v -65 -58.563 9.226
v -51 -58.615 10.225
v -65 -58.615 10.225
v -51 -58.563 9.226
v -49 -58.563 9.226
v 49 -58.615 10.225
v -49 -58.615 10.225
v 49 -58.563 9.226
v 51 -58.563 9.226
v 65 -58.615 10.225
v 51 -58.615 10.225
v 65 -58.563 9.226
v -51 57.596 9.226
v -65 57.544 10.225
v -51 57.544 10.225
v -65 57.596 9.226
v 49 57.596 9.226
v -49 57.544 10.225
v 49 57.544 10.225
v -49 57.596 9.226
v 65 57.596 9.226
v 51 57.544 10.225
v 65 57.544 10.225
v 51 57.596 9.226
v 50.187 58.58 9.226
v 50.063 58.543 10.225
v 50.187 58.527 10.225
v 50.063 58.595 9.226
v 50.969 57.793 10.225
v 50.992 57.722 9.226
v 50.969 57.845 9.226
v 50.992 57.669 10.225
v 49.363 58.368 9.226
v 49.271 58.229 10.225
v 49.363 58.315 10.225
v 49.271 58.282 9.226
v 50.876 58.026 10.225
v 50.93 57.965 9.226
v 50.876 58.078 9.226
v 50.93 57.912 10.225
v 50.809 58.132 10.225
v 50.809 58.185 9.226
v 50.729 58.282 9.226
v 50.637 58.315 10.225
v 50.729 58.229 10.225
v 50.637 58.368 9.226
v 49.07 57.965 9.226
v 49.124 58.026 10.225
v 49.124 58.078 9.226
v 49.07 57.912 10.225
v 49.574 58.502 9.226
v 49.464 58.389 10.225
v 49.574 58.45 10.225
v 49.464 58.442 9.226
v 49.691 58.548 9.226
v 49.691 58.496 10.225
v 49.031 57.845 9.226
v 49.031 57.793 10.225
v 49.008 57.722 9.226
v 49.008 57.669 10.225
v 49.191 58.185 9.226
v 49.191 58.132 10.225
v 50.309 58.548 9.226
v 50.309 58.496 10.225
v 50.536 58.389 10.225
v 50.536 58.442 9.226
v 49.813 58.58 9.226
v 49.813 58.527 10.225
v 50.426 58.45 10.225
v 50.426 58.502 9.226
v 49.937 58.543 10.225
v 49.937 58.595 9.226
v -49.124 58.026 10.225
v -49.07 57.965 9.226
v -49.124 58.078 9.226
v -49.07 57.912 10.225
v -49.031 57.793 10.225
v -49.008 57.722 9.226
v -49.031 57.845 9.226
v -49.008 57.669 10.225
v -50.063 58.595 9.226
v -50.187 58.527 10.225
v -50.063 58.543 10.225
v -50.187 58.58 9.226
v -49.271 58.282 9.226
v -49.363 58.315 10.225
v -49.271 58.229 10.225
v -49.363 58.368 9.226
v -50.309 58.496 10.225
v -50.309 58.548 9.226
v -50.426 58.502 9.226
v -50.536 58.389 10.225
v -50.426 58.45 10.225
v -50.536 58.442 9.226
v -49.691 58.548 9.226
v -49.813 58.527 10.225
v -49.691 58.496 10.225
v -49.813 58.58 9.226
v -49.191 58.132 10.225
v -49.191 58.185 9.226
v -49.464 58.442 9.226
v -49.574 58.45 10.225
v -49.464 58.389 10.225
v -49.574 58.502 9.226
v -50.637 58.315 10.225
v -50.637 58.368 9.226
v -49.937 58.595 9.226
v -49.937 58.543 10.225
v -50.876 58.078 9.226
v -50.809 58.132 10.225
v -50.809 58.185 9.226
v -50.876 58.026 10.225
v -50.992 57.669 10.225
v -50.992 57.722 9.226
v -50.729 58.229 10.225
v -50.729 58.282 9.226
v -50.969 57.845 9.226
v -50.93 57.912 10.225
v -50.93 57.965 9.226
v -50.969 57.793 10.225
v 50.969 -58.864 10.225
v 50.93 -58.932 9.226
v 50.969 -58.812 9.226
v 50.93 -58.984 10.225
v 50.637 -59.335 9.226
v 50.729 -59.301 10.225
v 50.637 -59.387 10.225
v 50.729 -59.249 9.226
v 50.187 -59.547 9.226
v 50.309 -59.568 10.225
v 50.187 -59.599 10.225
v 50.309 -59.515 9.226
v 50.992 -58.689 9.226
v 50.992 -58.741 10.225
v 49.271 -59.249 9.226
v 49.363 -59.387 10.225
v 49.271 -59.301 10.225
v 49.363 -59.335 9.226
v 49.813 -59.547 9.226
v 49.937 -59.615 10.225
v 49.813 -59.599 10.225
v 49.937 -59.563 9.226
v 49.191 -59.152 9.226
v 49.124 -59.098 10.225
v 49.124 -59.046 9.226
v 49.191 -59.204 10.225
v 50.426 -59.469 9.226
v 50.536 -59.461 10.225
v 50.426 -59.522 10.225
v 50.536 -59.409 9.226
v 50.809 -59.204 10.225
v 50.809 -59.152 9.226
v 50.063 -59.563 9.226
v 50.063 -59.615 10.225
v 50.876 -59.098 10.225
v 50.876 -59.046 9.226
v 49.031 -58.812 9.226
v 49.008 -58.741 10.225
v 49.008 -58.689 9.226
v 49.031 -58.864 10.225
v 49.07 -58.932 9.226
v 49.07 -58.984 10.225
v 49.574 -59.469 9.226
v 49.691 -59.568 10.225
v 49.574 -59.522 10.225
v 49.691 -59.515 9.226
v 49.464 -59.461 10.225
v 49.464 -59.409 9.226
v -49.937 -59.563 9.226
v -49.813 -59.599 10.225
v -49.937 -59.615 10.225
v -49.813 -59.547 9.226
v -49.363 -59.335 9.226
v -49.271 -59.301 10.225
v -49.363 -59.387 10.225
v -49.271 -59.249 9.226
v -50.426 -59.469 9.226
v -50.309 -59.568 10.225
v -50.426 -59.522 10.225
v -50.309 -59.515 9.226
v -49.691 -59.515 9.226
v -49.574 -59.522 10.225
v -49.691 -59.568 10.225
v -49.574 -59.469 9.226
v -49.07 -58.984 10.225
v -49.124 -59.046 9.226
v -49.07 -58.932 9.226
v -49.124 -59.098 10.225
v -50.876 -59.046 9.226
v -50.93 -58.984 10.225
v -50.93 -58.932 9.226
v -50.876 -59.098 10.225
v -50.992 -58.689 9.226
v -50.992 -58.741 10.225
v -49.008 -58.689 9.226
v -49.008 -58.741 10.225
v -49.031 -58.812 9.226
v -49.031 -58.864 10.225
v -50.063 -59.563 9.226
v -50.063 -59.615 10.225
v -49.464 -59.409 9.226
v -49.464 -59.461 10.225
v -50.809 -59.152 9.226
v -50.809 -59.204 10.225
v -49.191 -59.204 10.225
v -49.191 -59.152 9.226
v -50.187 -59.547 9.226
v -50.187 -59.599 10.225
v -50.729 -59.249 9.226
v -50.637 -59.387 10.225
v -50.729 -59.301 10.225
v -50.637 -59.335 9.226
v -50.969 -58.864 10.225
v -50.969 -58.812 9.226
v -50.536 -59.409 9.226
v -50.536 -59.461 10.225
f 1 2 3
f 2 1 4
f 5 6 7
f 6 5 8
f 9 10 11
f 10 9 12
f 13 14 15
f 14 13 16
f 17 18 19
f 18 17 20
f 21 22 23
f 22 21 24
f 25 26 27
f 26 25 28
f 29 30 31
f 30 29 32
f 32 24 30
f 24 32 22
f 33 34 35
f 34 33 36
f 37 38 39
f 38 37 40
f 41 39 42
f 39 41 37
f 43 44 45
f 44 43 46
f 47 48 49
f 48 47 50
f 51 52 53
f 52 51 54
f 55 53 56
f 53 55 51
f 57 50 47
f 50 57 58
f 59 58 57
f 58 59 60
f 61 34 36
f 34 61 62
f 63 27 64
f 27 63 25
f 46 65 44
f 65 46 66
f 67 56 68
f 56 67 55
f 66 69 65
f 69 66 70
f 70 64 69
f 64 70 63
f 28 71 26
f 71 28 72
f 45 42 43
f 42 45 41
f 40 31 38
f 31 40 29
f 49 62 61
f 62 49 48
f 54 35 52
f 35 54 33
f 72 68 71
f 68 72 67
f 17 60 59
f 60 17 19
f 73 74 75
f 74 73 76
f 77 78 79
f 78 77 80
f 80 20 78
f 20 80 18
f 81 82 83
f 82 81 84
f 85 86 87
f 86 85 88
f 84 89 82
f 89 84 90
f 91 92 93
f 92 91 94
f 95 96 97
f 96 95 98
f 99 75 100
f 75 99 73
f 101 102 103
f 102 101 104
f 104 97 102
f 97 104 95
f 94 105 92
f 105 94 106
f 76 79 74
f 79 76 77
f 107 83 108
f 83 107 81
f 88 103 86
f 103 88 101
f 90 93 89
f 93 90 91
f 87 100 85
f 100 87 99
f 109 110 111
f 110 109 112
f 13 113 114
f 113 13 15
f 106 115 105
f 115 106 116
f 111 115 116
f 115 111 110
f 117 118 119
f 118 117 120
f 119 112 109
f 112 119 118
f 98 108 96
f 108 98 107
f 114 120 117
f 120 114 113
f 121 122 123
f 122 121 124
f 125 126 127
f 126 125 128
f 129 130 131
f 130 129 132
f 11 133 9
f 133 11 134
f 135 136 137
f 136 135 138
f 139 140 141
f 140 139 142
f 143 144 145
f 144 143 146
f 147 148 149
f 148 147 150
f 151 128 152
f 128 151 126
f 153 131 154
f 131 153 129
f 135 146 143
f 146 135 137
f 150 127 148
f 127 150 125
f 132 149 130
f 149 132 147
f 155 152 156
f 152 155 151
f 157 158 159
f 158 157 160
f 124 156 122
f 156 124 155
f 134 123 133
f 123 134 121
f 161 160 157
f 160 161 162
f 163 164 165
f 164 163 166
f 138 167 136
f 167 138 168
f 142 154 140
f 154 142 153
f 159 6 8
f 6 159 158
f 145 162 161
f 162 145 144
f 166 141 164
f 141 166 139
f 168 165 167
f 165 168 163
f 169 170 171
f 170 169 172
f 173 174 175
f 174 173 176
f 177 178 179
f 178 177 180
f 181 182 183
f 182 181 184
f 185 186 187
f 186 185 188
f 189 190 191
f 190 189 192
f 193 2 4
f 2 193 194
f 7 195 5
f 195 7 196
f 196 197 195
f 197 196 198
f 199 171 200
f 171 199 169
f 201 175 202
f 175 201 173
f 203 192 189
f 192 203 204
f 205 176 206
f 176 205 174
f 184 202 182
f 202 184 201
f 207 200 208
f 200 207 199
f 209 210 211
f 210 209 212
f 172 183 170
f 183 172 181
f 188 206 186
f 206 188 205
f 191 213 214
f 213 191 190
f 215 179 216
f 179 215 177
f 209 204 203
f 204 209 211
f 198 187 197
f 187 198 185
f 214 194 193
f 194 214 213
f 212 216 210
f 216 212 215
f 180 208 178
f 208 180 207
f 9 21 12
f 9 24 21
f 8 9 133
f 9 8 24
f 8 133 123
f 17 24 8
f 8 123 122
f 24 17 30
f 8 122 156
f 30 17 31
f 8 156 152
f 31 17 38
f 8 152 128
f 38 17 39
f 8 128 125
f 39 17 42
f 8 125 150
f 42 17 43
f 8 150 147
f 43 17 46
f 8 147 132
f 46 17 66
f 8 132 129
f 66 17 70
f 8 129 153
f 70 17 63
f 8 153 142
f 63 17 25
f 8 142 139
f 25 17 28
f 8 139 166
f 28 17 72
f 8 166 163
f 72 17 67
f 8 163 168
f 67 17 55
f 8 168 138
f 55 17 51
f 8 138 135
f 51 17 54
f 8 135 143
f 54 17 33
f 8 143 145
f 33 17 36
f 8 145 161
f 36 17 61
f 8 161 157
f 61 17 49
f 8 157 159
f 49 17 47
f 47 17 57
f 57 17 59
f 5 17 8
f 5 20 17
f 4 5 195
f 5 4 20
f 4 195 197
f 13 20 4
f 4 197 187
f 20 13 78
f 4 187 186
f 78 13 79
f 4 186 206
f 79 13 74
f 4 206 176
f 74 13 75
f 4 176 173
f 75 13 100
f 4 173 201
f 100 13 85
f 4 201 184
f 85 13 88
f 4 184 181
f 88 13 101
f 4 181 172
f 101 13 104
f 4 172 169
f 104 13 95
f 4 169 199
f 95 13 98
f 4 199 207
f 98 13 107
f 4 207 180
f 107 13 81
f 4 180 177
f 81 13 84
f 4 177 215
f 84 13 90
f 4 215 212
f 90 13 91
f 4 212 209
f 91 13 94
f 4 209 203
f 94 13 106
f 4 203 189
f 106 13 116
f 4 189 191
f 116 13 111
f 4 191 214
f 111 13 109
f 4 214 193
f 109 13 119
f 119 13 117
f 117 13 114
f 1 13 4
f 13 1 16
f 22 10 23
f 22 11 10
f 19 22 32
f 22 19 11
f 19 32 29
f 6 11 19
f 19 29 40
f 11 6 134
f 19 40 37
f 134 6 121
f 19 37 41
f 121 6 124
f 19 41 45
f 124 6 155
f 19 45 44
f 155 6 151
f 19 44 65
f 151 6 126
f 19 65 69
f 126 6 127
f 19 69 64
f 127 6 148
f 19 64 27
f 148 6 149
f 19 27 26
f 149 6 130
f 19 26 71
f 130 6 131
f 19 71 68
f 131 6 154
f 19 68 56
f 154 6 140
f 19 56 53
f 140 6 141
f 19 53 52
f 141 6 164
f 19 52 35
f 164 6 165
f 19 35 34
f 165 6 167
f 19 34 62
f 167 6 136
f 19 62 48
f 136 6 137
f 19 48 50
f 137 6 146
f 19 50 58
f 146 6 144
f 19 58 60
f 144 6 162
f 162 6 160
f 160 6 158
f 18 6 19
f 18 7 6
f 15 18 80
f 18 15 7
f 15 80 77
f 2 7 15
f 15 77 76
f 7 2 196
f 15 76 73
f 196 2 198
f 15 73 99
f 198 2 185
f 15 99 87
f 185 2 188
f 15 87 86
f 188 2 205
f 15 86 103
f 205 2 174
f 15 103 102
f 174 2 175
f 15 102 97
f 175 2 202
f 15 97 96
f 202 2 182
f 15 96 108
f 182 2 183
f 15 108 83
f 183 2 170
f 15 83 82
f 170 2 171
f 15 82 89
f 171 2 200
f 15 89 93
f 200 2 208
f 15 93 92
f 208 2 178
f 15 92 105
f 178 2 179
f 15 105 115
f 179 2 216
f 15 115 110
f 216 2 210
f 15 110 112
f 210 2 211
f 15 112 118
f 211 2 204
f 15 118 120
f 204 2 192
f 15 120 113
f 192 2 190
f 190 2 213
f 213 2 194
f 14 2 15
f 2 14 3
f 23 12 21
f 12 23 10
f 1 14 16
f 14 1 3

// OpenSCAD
 RADIUS = 10;
 WIDTH = 114; 
 LENGTH = 280;// - 30
 SHELL = 2;
 
 HEIGHT= 9;
 
 TOLERANCE = 1;
 
 HOLE_SIZE = 16;
 HOLE_SIZE_HORIZONTAL_DIFF = 5;
 HOLE_SIZE_VERTICAL_DIFF = 10;
 HOLE_RADIUS = 5;
 ROUNDNESS = 2;
 
 RAIL_LENGTH = LENGTH - 10;
 RAIL_RADIUS = 0.75;
 RAIL_HEIGHT = 1;
 
 NOTCH_INDENT = 1.5;
 NOTCH_HOOKS = 50;
 
  module cutoff_cube() {
     mirror([0, 1,0]) {
         translate([0, -WIDTH/2-TOLERANCE/2-SHELL -50,HEIGHT])
         rotate(a=3,v=[1, 0 ,0])
         translate([-200, 0, 0])
     cube([400, 300, 100]);
     }
}

 module rail() {
     translate([-LENGTH/2 + 20, -2 * RAIL_RADIUS, 0])
     cube([RAIL_LENGTH, 2 * RAIL_RADIUS,RAIL_HEIGHT]); 
     translate([-LENGTH/2 + 20, -RAIL_RADIUS, RAIL_HEIGHT])
     rotate(a=90, v=[0, 1, 0])
     cylinder(h=RAIL_LENGTH, r=RAIL_RADIUS, center=false, $fn=50);
 }
 
 module sides() {
  linear_extrude(height = 2 * HEIGHT, slices = 60, $fn=50) {
         difference() {
            offset(r=(RADIUS + SHELL)) {square([LENGTH - 2 * RADIUS + TOLERANCE, WIDTH - 2 * RADIUS + TOLERANCE], center = true); }
            offset(r = RADIUS) { square([LENGTH - 2 * RADIUS + TOLERANCE, WIDTH - 2 * RADIUS + TOLERANCE], center = true); }
         }
     }
 }
 
 module sides_notch(extra = 0) {
  linear_extrude(height = 2 * HEIGHT + 5, slices = 60, $fn=50) {
         offset(r=(RADIUS + SHELL + extra)) {square([LENGTH - 2 * RADIUS + TOLERANCE - 2 * NOTCH_INDENT, WIDTH - 2 * RADIUS + TOLERANCE -  2 * NOTCH_INDENT], center = true); }
     }
     translate([NOTCH_HOOKS, 0.5 * (WIDTH - 2 * RADIUS + TOLERANCE -  2 * NOTCH_INDENT) + RADIUS + SHELL, HEIGHT])
     cylinder(r=(1 + extra), h=2 * HEIGHT + 5, $fn=50, center=true);
     translate([-NOTCH_HOOKS, 0.5 * (WIDTH - 2 * RADIUS + TOLERANCE -  2 * NOTCH_INDENT) + RADIUS + SHELL, HEIGHT])
     cylinder(r=(1 + extra), h=2 * HEIGHT + 5, $fn=50, center=true);
     translate([NOTCH_HOOKS, -0.5 * (WIDTH - 2 * RADIUS + TOLERANCE -  2 * NOTCH_INDENT) - RADIUS - SHELL, HEIGHT])
     cylinder(r=(1 + extra), h=2 * HEIGHT + 5, $fn=50, center=true);
     translate([-NOTCH_HOOKS, -0.5 * (WIDTH - 2 * RADIUS + TOLERANCE -  2 * NOTCH_INDENT) - RADIUS - SHELL, HEIGHT])
     cylinder(r=(1 + extra), h=2 * HEIGHT + 5, $fn=50, center=true);
 }
 
module notch(extra =0) {
  intersection() {
      sides_notch(extra);
      difference() {
        translate([0, 0, -5.5 - extra])
        cutoff_cube();
        translate([0, 0, -4.5 + extra])
        cutoff_cube();
      }
  }
}
 
 module cover_new() {
     translate([15, 0, 0]) {
         // outer side shell, with hole for plug
        difference() {
          sides();
           translate([-6.5,  -0.5 * (WIDTH - 2 * RADIUS + TOLERANCE) - RADIUS - 10, 2])
           cube([13, 20, 50]);
         }
         intersection() {
             // bottom shell
             translate([0, 0, -SHELL])
             minkowski() {
                linear_extrude(height = SHELL, slices = 60, $fn=50) {
                     offset(r=(RADIUS + SHELL)) {square([LENGTH - 2 * RADIUS + TOLERANCE - 2 * ROUNDNESS, WIDTH - 2 * RADIUS + TOLERANCE - 2* ROUNDNESS], center = true); }
                 }
                 sphere(r = ROUNDNESS, $fn = 50);
             }
             translate([-200, -200, -200])
             cube([400, 400, 200]);
         }
     }
     
     // rails
     translate([0, RADIUS + 0.5 *(WIDTH - 2 * RADIUS + TOLERANCE), 0])
     rail();
     
     for (idx =[0:4]) {
         translate([0, RADIUS + 0.5 *(WIDTH - 2 * RADIUS + TOLERANCE) - 20 - 18.5 * idx, 0])
     rail();
     }
     translate([0, RADIUS + 0.5 *(WIDTH - 2 * RADIUS + TOLERANCE)- 20 - 18.5 * 4 - 20, 0])
     rail();
 }

  module cover_new_with_holes(notch_padding = 0) {
     difference() {
         cover_new();
         
         // minus the corner
         translate([(LENGTH - HOLE_RADIUS - HOLE_SIZE_HORIZONTAL_DIFF - HOLE_SIZE + 2) / 2 + 30, -(WIDTH -5 - HOLE_RADIUS - HOLE_SIZE + 2) / 2 - 15, -2 * SHELL])
         linear_extrude(height = 5 * SHELL + 50, slices = 60, $fn=50) {
             offset(r=(HOLE_RADIUS)) {square([HOLE_SIZE + HOLE_SIZE_HORIZONTAL_DIFF - 2 * HOLE_RADIUS + TOLERANCE + 30, HOLE_SIZE + HOLE_SIZE_VERTICAL_DIFF - 5 - 2 * HOLE_RADIUS + TOLERANCE + 30], center = true); }
         }
        // translate([0, 0, -6])
        translate([0, 0, -3])
        cutoff_cube();
         translate([15, 0, 0])
        notch(notch_padding);
     }
 }

 module cover_right() {
     intersection() {
    cover_new_with_holes(0.5);
         translate([0, -200, -200])
         cube([400, 400, 400]);
     }
}

 module cover_left() {
     intersection() {
    cover_new_with_holes(0.5);
         translate([-400, -200, -200])
         cube([400, 400, 400]);
     }
}

module bump() {
    difference() {
        intersection() {
            translate([15, 0, 0]) sides();
            translate([0, 0, -7]) cutoff_cube();
        }
        translate([0, 0, -5]) cutoff_cube();
    }
}

module base() {
    rotate(a=3,v=[1, 0 ,0])
    intersection() {
        notch();
       cube([130, 120, 100], center=true);
    }
}

base();

// cover_left();
